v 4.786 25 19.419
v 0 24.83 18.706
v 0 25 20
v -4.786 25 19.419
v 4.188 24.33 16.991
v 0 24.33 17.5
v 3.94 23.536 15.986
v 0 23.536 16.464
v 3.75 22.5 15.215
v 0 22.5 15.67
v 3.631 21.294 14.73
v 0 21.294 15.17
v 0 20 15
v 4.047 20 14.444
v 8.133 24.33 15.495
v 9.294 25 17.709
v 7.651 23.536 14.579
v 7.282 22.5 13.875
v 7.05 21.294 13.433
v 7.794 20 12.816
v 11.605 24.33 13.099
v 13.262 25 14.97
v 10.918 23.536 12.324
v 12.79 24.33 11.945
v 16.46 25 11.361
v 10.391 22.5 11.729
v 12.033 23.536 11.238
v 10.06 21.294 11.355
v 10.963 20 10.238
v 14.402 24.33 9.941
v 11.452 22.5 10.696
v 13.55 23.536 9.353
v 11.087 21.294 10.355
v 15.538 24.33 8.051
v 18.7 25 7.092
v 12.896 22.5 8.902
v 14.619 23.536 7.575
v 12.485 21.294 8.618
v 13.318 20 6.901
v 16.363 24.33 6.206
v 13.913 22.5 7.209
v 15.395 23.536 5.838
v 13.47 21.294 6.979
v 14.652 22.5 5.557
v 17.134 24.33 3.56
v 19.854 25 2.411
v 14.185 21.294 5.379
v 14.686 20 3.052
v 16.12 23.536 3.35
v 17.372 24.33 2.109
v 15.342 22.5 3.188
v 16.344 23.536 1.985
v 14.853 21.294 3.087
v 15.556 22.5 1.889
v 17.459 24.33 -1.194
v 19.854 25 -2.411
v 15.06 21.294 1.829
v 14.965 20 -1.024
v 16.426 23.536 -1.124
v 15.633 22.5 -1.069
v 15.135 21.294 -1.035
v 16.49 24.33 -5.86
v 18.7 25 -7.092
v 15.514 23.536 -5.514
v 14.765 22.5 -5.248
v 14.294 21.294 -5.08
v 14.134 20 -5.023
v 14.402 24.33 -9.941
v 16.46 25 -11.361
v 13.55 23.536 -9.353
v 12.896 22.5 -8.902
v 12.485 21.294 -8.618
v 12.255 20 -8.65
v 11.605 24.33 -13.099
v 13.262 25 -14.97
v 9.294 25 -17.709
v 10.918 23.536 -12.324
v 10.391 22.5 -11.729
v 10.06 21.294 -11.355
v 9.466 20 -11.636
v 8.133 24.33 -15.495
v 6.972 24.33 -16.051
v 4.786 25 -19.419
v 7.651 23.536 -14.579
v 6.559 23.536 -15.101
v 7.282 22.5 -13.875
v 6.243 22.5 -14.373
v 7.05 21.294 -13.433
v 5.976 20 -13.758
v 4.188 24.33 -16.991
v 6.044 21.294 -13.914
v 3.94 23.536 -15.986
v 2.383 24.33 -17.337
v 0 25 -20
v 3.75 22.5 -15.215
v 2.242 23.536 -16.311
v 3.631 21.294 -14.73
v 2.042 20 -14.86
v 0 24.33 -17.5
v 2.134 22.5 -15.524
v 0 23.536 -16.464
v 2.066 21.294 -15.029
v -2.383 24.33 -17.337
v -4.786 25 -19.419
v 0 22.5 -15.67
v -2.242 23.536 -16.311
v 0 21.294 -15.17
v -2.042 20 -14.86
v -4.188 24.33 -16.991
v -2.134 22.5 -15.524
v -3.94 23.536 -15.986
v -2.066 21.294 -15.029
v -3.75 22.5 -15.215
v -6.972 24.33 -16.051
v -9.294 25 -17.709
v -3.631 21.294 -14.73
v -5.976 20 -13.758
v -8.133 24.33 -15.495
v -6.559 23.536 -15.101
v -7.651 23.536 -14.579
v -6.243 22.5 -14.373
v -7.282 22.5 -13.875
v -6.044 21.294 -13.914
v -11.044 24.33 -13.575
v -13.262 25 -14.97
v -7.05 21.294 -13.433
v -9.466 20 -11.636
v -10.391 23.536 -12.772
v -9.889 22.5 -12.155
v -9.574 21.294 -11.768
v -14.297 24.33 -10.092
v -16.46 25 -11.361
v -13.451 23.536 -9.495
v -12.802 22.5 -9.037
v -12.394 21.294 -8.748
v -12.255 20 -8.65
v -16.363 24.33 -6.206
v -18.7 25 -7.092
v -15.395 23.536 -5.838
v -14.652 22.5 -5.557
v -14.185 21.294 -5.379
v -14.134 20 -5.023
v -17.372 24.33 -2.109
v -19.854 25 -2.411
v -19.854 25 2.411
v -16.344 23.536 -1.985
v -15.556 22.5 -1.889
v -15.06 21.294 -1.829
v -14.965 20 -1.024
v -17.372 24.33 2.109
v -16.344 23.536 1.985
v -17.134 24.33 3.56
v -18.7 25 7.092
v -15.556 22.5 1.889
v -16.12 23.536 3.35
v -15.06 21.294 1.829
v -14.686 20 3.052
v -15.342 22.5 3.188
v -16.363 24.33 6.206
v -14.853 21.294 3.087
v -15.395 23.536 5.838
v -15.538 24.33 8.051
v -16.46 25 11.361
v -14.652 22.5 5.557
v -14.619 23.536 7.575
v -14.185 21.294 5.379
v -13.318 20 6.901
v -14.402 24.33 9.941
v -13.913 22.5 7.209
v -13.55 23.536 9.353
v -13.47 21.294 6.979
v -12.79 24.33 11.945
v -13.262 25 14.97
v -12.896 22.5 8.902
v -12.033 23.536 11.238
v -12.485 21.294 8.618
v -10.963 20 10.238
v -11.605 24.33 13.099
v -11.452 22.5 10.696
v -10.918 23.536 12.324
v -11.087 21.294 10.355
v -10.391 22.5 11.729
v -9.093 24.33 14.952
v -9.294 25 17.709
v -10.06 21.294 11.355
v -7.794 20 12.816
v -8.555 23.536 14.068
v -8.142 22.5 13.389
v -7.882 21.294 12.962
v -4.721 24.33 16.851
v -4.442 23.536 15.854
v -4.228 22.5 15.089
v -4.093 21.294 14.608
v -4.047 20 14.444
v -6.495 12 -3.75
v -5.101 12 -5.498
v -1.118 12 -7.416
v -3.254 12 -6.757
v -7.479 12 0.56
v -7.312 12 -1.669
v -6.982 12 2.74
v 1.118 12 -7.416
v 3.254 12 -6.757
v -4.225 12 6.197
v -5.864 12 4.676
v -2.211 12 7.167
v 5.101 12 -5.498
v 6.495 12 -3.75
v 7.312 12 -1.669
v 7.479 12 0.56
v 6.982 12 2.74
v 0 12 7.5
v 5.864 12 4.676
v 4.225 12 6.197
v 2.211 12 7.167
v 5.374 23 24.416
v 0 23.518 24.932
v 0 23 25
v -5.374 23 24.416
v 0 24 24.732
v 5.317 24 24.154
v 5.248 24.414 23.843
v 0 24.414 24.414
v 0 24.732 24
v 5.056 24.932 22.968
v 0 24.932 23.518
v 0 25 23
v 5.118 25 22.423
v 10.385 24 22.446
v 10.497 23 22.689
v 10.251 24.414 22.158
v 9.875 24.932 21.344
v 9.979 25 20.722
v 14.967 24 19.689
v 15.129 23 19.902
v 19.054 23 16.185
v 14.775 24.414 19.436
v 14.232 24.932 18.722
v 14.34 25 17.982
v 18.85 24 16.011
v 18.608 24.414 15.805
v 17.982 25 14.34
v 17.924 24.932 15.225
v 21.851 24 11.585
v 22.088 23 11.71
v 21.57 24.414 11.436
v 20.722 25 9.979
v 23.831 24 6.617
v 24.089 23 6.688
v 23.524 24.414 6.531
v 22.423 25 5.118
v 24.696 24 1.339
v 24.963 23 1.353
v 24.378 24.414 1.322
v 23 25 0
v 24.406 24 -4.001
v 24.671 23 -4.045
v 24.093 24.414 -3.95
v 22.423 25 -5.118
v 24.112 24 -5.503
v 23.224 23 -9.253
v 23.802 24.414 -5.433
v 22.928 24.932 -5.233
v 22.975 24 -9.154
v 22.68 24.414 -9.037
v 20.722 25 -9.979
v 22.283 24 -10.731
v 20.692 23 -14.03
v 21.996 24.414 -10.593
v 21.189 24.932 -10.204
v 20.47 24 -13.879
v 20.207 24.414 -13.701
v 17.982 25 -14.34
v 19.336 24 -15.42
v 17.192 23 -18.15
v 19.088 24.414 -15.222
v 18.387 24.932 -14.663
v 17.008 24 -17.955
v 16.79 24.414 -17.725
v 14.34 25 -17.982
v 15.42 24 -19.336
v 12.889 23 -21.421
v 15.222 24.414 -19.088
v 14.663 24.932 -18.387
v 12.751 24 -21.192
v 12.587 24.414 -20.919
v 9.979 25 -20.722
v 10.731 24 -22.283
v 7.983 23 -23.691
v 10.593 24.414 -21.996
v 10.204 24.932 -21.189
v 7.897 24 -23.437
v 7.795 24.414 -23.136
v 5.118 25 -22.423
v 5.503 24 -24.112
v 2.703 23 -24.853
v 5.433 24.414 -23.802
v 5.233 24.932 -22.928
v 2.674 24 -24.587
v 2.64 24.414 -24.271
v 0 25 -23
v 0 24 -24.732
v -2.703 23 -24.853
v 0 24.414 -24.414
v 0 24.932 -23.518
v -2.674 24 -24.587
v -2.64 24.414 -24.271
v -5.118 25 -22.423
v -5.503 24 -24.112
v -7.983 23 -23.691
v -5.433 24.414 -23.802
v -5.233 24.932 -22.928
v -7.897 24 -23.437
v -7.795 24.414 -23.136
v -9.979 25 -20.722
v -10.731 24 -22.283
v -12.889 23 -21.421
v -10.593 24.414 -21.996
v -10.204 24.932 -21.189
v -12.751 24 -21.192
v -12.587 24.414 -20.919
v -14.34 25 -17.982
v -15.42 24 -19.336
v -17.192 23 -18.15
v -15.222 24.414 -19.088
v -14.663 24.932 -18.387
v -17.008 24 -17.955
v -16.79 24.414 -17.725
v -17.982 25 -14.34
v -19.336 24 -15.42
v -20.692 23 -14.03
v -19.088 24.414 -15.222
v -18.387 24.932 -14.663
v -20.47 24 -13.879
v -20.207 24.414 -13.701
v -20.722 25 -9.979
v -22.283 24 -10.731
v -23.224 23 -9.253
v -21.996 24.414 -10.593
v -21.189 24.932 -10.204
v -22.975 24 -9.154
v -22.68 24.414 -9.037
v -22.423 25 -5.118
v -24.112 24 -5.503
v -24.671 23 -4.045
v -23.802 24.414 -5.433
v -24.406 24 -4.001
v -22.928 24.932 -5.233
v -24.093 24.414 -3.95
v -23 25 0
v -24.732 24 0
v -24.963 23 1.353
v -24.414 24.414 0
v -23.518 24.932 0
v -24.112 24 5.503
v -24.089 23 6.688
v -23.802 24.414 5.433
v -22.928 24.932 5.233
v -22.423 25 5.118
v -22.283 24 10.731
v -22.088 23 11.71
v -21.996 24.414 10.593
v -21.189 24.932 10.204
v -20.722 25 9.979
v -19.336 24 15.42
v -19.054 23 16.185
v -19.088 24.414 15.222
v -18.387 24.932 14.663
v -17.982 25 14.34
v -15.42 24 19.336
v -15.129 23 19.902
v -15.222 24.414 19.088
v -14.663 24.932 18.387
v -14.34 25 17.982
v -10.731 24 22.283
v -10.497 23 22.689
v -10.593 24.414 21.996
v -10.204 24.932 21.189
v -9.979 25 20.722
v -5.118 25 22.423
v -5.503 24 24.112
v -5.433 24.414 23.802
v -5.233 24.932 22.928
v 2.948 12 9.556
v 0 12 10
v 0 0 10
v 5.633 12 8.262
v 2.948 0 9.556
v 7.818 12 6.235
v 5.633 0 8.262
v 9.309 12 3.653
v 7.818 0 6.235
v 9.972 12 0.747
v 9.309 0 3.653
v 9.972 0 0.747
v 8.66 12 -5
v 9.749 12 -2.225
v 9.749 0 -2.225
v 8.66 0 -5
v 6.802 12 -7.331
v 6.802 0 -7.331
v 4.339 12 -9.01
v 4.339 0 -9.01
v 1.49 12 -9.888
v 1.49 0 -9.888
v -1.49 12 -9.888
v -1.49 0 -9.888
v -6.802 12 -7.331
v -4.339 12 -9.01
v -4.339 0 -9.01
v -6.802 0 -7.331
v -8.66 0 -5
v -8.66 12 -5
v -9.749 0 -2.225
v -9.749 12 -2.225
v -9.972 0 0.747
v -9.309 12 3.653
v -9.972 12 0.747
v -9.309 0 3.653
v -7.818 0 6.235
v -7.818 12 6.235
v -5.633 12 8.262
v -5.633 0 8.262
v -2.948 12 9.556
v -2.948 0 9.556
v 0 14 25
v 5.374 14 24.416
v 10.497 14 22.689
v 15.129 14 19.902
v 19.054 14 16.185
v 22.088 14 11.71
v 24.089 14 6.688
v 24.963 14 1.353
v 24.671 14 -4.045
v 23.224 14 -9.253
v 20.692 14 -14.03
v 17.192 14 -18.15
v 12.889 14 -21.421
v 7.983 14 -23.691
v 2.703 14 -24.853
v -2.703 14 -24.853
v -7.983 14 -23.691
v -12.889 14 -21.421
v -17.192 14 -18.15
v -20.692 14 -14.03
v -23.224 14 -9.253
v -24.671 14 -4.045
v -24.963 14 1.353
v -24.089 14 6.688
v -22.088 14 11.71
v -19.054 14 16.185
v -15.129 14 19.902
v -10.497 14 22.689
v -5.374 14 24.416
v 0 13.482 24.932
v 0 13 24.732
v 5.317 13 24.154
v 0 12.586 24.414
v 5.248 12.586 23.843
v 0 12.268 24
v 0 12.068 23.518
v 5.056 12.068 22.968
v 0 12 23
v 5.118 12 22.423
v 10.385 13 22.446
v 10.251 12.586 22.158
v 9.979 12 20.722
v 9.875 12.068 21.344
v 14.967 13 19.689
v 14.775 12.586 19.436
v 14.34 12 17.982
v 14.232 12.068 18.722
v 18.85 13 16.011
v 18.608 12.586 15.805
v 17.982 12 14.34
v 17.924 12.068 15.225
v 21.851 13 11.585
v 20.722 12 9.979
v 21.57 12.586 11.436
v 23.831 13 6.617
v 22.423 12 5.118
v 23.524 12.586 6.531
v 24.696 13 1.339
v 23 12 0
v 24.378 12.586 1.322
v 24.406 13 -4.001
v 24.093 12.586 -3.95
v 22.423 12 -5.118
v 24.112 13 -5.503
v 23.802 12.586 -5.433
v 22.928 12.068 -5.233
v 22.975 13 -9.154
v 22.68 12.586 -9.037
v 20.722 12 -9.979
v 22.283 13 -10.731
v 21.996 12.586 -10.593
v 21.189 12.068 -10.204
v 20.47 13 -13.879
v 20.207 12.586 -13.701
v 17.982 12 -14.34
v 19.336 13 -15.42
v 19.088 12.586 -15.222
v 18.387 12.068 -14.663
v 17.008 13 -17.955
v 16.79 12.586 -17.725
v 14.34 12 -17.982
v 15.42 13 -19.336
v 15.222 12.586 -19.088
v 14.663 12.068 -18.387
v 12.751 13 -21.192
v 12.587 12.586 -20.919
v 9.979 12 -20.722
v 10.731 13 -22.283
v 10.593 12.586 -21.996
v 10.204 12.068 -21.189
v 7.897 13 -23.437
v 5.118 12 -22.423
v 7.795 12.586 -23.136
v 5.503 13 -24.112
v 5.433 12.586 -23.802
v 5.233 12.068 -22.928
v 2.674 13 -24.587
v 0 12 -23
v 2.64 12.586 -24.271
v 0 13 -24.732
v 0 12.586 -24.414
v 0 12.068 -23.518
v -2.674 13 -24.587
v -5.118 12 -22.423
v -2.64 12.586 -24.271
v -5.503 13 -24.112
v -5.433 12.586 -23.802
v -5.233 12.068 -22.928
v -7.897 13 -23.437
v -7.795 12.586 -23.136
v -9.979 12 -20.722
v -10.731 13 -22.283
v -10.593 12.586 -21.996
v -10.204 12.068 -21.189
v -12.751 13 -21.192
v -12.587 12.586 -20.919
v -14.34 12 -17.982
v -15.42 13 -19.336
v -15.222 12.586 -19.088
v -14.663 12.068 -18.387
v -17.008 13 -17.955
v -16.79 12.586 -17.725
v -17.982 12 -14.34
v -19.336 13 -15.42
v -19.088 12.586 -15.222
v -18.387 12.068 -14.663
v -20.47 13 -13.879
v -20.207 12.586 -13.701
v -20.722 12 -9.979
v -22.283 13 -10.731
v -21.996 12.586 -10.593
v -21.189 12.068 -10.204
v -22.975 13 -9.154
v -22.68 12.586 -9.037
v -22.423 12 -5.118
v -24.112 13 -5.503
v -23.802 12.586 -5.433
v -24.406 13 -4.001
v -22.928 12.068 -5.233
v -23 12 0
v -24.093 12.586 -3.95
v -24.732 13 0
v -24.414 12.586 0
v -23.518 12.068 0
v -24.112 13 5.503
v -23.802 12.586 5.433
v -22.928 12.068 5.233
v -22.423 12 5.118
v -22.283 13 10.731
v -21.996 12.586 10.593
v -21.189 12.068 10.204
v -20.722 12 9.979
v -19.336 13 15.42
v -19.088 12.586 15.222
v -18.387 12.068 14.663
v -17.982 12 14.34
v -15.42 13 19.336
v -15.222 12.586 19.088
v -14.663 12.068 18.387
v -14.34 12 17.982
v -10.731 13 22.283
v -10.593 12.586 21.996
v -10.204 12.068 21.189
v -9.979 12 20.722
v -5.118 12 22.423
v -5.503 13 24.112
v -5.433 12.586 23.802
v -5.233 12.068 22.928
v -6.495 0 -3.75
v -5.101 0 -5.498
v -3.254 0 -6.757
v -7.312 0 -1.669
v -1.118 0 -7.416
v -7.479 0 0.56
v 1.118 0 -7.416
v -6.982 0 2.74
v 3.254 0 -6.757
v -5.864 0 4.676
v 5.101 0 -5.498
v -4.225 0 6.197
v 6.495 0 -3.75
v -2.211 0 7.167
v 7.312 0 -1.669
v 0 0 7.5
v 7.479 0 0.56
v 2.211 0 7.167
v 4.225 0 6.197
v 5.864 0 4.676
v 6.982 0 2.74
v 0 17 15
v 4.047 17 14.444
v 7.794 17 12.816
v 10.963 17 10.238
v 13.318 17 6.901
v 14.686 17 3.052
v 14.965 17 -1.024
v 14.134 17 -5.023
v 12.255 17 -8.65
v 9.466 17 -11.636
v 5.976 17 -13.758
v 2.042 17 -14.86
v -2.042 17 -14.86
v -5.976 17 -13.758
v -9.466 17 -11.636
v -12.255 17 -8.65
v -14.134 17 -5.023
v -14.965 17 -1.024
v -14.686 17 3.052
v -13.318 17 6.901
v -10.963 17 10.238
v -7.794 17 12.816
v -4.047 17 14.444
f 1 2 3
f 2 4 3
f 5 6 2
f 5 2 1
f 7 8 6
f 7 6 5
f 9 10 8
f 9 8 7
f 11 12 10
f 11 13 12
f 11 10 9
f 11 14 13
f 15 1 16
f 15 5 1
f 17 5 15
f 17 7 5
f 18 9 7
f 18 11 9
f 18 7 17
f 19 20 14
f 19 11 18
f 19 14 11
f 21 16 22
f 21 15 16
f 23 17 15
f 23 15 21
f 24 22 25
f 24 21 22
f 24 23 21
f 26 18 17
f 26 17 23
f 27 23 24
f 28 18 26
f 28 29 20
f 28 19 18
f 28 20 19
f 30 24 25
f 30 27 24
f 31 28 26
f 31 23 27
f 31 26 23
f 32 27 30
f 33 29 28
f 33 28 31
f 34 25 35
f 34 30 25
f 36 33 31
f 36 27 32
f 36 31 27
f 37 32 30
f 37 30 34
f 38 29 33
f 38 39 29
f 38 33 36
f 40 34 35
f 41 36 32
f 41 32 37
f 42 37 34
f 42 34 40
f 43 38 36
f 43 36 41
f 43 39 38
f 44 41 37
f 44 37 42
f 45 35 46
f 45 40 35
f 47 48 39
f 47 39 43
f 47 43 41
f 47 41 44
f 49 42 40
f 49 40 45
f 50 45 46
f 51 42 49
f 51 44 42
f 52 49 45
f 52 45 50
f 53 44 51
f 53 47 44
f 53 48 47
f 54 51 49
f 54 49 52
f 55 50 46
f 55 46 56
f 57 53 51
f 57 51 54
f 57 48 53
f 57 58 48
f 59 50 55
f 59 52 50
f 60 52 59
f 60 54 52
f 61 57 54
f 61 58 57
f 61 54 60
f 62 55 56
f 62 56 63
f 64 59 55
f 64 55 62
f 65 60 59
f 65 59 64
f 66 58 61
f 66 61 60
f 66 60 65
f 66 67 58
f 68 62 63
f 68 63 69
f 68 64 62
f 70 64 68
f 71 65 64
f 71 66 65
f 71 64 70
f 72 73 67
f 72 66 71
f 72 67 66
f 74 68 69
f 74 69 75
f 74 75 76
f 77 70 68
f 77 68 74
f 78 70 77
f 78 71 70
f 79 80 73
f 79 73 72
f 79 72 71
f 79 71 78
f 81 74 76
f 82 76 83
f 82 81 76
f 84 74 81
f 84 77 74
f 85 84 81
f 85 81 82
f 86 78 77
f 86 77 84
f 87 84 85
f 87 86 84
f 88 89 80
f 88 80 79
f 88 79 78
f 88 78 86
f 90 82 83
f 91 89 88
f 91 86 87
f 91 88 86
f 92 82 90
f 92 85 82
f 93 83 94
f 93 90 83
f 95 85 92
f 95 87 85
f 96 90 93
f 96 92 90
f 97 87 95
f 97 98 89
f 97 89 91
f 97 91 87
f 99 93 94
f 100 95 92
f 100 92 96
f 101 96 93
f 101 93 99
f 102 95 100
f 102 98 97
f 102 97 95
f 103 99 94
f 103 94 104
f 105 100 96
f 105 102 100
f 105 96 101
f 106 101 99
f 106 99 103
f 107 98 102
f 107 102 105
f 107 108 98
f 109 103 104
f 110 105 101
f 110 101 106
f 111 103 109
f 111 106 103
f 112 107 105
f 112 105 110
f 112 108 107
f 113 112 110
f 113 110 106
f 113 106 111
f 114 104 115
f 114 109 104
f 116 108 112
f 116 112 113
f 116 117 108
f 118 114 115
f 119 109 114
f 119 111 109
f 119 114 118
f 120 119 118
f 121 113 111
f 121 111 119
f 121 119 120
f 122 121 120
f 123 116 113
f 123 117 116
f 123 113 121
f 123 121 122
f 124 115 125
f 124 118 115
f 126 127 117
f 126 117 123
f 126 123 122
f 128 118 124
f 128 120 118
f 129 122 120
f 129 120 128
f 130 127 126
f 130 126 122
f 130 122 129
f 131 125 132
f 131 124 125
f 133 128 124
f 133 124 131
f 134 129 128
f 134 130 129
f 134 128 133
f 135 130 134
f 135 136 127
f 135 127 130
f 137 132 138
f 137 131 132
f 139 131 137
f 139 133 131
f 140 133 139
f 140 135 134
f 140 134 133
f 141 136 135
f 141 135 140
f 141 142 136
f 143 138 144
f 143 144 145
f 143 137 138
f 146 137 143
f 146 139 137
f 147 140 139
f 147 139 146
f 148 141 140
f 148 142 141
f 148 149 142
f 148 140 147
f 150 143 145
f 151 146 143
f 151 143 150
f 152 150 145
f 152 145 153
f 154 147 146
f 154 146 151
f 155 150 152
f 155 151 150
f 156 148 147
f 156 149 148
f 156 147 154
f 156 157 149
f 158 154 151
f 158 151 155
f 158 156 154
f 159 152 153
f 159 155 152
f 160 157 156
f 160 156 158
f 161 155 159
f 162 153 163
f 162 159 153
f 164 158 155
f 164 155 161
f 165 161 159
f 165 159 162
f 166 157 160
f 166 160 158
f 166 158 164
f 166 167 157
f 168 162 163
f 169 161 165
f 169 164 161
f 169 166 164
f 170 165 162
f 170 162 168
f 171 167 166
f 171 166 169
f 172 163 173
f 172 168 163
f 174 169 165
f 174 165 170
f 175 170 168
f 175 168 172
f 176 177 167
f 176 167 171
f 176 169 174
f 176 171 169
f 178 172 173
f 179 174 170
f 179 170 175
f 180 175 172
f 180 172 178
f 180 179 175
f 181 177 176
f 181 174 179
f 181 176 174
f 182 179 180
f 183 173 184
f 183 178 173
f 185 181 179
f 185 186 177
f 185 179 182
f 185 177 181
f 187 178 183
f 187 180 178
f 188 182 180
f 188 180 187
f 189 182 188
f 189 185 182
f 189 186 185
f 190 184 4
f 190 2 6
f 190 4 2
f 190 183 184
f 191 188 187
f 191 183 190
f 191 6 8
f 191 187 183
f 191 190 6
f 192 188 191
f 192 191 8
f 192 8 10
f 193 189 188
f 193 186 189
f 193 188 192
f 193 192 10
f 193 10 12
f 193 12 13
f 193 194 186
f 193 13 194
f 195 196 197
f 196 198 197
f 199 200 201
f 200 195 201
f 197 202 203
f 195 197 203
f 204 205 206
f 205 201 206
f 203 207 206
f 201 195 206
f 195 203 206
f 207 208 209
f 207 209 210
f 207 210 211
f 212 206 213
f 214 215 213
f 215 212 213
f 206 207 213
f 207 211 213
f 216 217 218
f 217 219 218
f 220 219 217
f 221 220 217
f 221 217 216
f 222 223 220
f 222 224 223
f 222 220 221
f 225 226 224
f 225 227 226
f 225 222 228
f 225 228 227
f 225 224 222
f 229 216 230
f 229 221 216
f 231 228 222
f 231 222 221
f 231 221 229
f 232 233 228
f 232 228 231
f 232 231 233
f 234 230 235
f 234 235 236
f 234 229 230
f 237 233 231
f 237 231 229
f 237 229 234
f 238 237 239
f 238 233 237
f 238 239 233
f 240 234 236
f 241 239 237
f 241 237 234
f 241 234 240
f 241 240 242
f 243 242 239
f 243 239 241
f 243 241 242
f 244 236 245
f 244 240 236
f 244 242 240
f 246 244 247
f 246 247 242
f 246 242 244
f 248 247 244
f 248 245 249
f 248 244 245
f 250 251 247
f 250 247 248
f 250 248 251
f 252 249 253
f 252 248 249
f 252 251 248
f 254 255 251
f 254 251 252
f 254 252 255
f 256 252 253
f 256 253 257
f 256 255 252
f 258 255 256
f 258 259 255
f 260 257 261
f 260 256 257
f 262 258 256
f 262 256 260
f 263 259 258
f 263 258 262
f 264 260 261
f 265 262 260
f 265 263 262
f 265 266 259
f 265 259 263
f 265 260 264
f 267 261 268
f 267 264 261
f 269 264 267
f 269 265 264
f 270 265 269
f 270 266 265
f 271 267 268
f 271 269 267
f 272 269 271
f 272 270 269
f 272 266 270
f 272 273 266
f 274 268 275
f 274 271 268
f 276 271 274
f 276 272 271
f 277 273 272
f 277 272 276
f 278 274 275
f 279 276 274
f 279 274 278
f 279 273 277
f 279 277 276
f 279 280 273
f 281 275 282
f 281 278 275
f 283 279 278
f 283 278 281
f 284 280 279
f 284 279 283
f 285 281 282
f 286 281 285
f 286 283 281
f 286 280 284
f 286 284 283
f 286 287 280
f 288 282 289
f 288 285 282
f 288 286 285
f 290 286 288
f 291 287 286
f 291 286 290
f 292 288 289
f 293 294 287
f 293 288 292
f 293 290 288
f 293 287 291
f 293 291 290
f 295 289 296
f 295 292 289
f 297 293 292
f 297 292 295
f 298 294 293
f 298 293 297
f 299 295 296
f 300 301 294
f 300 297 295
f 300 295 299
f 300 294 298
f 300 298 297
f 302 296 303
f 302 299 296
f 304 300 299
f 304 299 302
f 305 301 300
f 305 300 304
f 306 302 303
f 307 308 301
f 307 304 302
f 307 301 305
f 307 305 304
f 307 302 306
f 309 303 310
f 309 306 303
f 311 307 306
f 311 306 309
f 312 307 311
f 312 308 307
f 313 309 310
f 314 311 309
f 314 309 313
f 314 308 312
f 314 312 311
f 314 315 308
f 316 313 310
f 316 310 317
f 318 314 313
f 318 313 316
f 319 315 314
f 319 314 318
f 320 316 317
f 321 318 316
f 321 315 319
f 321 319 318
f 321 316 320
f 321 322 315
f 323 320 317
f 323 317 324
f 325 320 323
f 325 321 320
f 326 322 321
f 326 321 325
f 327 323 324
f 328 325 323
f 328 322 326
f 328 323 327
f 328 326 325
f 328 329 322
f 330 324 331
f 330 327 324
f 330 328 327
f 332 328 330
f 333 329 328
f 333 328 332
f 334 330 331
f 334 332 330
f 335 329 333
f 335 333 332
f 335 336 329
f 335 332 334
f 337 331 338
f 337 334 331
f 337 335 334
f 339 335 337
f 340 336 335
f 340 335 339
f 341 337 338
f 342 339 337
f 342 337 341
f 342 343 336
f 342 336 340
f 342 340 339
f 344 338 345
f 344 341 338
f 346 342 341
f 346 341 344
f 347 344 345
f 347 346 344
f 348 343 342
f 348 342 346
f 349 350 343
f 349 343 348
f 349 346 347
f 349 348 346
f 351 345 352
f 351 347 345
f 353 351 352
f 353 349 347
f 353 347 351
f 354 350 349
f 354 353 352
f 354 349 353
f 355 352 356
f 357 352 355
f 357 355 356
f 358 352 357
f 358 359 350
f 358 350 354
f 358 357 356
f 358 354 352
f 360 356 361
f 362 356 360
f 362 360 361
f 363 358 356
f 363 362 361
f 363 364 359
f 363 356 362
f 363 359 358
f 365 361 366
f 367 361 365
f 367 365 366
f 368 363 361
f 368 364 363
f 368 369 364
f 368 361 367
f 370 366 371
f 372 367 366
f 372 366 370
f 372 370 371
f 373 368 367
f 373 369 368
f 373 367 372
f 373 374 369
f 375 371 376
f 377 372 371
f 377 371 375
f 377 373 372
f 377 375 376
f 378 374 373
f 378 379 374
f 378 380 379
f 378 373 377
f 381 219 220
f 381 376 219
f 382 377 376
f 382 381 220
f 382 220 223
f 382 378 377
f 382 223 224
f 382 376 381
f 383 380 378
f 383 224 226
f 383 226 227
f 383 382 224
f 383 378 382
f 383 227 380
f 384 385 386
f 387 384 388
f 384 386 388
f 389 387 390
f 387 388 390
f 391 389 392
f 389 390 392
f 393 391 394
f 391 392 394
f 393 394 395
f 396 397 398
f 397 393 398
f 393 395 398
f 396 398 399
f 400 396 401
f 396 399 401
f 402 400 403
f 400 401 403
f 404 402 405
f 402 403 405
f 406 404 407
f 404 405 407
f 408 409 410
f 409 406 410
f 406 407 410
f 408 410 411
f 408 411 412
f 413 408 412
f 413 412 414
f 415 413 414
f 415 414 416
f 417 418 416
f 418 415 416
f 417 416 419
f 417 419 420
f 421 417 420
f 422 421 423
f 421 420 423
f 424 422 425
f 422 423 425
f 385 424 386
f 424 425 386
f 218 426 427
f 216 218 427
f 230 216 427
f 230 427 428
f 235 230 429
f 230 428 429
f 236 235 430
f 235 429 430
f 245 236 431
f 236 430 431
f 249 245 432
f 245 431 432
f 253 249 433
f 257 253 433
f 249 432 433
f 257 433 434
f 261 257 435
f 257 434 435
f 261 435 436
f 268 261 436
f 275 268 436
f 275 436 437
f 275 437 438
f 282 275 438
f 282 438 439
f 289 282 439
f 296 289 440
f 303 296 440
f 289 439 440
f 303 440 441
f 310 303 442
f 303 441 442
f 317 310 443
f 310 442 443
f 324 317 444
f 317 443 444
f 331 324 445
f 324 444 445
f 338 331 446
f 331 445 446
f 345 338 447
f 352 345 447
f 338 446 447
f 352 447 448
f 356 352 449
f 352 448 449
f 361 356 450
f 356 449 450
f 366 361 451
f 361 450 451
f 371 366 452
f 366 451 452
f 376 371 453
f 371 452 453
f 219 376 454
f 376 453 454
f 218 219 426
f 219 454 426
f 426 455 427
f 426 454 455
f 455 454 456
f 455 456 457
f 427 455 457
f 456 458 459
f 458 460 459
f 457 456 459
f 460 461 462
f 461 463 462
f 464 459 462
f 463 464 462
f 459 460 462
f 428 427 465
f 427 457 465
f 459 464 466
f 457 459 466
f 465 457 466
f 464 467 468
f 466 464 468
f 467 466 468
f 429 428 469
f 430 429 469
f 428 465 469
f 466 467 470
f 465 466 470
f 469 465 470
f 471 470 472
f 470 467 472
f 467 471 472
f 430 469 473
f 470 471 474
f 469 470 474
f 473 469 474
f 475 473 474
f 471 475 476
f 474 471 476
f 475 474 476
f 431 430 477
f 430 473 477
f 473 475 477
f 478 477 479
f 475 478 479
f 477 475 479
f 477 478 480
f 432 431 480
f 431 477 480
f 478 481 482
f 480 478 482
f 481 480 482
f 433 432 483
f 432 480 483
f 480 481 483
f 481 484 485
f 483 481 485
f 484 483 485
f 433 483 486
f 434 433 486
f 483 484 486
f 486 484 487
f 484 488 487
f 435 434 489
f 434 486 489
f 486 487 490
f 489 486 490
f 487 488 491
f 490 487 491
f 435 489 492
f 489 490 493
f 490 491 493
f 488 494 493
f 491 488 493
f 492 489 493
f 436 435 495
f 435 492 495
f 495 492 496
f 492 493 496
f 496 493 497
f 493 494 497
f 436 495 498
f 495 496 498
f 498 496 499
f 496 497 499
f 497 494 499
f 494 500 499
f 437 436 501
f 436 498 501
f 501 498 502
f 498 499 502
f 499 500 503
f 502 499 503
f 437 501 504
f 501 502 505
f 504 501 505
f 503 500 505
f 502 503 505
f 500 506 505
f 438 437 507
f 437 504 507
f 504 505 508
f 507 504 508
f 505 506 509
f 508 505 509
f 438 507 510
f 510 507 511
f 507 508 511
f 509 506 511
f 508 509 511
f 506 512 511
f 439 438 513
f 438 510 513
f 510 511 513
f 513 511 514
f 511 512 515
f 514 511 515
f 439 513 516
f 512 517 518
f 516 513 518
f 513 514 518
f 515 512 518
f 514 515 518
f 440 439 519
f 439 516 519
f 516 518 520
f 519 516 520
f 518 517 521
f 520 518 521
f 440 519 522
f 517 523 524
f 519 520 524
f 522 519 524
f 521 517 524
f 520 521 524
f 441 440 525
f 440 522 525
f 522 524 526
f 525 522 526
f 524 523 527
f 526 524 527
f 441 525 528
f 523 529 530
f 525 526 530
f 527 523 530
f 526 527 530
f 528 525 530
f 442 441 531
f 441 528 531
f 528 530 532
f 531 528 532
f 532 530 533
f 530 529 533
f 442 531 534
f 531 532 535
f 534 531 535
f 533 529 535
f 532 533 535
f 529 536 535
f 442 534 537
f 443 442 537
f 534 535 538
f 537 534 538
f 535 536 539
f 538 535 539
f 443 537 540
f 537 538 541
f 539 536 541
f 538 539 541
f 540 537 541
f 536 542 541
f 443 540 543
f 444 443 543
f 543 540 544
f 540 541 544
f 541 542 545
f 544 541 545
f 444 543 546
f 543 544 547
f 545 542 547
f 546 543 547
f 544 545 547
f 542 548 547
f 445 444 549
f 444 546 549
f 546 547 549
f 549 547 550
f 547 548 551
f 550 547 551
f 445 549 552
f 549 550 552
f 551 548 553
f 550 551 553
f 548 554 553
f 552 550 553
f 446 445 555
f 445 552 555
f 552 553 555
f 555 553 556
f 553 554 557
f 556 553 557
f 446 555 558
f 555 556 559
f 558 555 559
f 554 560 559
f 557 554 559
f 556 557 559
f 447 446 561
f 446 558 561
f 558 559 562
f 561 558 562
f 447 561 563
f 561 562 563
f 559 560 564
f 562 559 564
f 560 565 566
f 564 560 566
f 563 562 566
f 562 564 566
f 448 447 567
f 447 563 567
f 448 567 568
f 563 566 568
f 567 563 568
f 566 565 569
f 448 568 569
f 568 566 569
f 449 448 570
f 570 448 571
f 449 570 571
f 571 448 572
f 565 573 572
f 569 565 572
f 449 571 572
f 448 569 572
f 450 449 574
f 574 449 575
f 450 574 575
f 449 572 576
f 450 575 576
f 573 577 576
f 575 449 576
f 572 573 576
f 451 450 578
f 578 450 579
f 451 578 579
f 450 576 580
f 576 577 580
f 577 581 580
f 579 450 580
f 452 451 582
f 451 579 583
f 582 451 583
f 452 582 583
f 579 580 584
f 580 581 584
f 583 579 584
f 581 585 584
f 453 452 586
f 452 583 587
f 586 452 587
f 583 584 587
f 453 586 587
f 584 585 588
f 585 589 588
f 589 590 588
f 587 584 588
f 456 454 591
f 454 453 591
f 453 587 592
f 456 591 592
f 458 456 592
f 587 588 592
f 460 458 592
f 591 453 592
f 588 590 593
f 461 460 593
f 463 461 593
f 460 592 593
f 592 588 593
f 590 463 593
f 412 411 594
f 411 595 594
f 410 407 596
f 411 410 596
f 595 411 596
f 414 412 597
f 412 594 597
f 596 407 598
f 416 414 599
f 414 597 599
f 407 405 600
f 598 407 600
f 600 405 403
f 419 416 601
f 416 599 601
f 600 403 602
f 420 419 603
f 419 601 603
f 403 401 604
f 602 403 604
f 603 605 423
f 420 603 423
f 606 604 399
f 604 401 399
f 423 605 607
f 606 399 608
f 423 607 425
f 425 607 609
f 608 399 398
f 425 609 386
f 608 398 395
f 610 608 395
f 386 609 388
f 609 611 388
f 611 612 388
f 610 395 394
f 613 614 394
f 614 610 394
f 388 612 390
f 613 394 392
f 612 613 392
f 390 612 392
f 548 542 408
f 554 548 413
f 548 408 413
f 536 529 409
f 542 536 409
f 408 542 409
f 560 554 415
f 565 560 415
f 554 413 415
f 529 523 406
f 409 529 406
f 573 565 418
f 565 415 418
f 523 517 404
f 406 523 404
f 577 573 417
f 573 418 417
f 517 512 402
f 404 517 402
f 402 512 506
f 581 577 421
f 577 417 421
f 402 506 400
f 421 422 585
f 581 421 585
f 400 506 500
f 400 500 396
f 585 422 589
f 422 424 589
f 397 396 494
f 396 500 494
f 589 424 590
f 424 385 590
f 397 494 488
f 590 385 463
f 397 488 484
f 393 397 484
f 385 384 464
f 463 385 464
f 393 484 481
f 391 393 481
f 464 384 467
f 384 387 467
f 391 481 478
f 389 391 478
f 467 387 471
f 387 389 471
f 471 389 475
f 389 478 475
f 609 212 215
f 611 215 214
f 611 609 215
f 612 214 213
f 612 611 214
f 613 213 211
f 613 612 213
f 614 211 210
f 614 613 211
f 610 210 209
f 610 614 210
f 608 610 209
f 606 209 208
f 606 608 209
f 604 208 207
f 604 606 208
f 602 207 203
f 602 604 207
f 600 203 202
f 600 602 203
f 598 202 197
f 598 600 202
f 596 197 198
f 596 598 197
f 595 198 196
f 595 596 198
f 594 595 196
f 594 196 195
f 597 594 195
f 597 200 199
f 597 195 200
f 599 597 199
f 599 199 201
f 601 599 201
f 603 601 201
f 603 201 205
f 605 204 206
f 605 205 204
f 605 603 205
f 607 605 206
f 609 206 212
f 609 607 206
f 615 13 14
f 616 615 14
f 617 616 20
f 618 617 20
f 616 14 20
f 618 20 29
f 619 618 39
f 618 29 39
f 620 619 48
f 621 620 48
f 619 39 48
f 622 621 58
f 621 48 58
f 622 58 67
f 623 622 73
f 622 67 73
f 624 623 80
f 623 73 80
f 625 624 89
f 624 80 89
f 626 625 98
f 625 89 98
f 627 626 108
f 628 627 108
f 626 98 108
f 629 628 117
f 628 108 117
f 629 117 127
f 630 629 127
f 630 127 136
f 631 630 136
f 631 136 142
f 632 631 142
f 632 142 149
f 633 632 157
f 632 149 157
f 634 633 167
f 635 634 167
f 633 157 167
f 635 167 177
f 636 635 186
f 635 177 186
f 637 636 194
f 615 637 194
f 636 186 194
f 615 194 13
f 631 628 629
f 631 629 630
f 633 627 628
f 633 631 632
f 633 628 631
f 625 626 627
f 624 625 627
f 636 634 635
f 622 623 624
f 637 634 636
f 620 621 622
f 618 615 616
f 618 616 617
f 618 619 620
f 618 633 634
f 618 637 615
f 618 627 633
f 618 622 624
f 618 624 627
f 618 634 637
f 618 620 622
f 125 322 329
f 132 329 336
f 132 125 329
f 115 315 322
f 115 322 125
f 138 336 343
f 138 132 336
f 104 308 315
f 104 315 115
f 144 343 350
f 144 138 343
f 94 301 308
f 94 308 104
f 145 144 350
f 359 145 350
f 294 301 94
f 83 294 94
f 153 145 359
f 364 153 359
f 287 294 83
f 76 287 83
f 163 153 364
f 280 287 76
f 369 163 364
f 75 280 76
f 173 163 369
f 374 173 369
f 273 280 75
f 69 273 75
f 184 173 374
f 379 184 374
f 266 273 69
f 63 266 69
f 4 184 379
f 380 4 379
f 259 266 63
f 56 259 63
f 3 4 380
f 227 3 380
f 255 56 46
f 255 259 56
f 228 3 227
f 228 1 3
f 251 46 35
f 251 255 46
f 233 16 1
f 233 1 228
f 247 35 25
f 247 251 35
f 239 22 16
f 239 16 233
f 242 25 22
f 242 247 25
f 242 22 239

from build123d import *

# Parameters (mm, degrees)
SKETCH1_R                = 10
SKETCH1_R_2              = 7.5
BOSS_EXTRUDE1_DEPTH      = 15
BOSS_EXTRUDE2_DEPTH      = 10
BOSS_EXTRUDE2_DEPTH_BACK = 3
SKETCH3_R                = 25
FILLET1_R                = 2
SKETCH4_R                = 15
CUT_EXTRUDE1_DEPTH       = 8
FILLET2_R                = 5


with BuildPart() as part:
    # Sketch1 → Boss-Extrude1 (new body)
    with BuildSketch(Plane(origin=(0, 0, 0), x_dir=(1, 0, 0), z_dir=(0, 1, 0))):
        with Locations(Location((0, 0, 0), (0, 0, 270))):
            Circle(SKETCH1_R)
        with Locations(Location((0, 0, 0), (0, 0, 270))):
            Circle(SKETCH1_R_2, mode=Mode.SUBTRACT)
    extrude(amount=BOSS_EXTRUDE1_DEPTH)

    # Sketch3 → Boss-Extrude2 (add, two sides: drawn at the far end of the back side and taken through both)
    with BuildSketch(Plane(origin=(0, 15, 0), x_dir=(1, 0, 0), z_dir=(0, 1, 0)).offset(-BOSS_EXTRUDE2_DEPTH_BACK)):
        with Locations(Location((0, 0, 0), (0, 0, 270))):
            Circle(SKETCH3_R)
    extrude(amount=BOSS_EXTRUDE2_DEPTH + BOSS_EXTRUDE2_DEPTH_BACK)

    # Fillet1
    fillet1_edges = [part.edges().sort_by_distance(p)[0] for p in [
        (0, 12, -25),
        (0, 25, -25),
    ]]
    fillet(fillet1_edges, radius=FILLET1_R)

    # Sketch4 → Cut-Extrude1 (cut)
    with BuildSketch(Plane(origin=(0, 25, 0), x_dir=(1, 0, 0), z_dir=(0, 1, 0))):
        with Locations(Location((0, 0, 0), (0, 0, 270))):
            Circle(SKETCH4_R)
    extrude(amount=-CUT_EXTRUDE1_DEPTH, mode=Mode.SUBTRACT)

    # Fillet2
    fillet2_edges = [part.edges().sort_by_distance(p)[0] for p in [
        (0, 25, -15),
    ]]
    fillet(fillet2_edges, radius=FILLET2_R)


solid = part.part
